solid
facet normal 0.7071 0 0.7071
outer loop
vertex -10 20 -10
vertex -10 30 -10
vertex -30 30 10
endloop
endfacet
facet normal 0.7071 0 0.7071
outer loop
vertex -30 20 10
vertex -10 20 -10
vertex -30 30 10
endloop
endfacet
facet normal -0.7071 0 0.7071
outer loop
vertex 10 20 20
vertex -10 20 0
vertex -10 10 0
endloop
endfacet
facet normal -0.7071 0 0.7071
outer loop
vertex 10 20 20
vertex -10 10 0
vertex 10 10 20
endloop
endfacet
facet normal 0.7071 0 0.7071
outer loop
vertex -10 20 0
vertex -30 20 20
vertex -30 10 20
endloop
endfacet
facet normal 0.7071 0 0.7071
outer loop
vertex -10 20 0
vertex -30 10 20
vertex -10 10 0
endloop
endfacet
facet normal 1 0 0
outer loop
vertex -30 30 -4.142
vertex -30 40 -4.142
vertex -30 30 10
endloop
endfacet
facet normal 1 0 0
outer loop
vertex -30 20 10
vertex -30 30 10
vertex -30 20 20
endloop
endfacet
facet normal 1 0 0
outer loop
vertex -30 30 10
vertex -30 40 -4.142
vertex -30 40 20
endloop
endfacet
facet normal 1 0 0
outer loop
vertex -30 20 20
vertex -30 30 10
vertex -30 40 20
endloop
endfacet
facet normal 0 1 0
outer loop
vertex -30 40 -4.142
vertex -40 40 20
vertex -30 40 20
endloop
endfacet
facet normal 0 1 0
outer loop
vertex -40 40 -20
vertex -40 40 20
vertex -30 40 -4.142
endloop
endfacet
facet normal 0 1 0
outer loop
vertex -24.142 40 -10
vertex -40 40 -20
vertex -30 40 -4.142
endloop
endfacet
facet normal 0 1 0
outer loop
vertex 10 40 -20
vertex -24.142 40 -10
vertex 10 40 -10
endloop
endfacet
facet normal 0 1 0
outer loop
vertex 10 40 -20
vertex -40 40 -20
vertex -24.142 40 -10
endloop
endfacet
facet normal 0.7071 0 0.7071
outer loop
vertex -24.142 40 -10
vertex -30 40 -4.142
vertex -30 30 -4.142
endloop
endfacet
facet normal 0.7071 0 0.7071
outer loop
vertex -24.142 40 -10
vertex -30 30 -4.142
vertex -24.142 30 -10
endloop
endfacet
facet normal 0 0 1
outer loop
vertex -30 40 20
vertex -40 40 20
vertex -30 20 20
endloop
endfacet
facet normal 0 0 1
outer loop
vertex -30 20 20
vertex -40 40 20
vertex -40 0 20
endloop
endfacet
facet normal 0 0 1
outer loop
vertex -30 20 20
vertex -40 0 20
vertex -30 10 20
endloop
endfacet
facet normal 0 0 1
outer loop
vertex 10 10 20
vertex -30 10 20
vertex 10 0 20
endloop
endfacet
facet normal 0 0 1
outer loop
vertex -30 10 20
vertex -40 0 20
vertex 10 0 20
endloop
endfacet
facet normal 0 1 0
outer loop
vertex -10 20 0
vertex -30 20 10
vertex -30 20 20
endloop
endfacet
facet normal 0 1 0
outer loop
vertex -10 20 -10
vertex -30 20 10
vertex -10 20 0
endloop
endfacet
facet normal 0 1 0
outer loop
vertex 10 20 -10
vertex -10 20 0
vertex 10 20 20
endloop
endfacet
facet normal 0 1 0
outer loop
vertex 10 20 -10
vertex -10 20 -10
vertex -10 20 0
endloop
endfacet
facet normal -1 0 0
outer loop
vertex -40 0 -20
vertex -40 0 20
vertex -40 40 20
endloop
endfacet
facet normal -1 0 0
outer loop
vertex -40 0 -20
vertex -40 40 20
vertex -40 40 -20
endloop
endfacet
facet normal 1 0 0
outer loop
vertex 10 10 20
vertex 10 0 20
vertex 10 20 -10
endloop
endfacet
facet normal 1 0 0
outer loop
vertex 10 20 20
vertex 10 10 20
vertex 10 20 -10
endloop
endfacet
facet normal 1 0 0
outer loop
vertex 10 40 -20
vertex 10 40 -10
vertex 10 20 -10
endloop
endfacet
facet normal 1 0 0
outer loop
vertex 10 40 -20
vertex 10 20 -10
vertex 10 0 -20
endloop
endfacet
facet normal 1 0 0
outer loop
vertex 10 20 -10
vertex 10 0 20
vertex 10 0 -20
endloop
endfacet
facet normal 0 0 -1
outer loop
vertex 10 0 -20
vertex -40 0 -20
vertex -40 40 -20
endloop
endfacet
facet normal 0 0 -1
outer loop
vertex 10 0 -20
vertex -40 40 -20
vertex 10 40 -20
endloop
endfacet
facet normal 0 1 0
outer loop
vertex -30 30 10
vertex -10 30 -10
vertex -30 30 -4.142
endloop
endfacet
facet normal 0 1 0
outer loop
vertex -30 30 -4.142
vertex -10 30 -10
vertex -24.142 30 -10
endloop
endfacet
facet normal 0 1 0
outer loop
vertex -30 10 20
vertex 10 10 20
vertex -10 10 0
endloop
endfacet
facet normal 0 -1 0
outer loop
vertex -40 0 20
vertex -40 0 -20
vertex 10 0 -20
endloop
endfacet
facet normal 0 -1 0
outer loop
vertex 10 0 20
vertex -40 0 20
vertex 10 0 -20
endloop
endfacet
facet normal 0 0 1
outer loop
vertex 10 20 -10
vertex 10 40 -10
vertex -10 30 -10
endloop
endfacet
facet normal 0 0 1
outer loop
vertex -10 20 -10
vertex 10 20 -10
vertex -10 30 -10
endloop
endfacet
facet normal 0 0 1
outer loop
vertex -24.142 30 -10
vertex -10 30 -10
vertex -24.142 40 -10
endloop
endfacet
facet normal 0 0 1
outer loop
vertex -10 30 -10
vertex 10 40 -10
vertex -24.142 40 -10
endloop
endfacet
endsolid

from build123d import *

# Parameters (mm, degrees)
SKETCH1_W           = 50
SKETCH1_H           = 40
BOSS_EXTRUDE1_DEPTH = 40
CUT_EXTRUDE1_DEPTH  = 10
CUT_EXTRUDE2_DEPTH  = 20
CUT_EXTRUDE3_DEPTH  = 10


with BuildPart() as part:
    # Sketch1 → Boss-Extrude1 (new body)
    with BuildSketch(Plane(origin=(0, 0, 0), x_dir=(1, 0, 0), z_dir=(0, 1, 0))):
        with Locations((-15, 0)):
            Rectangle(SKETCH1_W, SKETCH1_H)
    extrude(amount=BOSS_EXTRUDE1_DEPTH)

    # Sketch2 → Cut-Extrude1 (cut)
    with BuildSketch(Plane(origin=(0, 40, 0), x_dir=(1, 0, 0), z_dir=(0, 1, 0))):
        Polygon((-30, -10), (-30, 4.142135624), (-24.142135624, 10), (-10, 10), align=None)
    extrude(amount=-CUT_EXTRUDE1_DEPTH, mode=Mode.SUBTRACT)

    # Sketch3 → Cut-Extrude2 (cut)
    with BuildSketch(Plane(origin=(0, 40, 0), x_dir=(1, 0, 0), z_dir=(0, 1, 0))):
        Polygon((-30, -10), (-30, -20), (10, -20), (10, 10), (-10, 10), align=None)
    extrude(amount=-CUT_EXTRUDE2_DEPTH, mode=Mode.SUBTRACT)

    # Sketch4 → Cut-Extrude3 (cut)
    with BuildSketch(Plane(origin=(0, 20, 0), x_dir=(1, 0, 0), z_dir=(0, 1, 0))):
        Polygon((-30, -20), (-10, 0), (10, -20), align=None)
    extrude(amount=-CUT_EXTRUDE3_DEPTH, mode=Mode.SUBTRACT)


solid = part.part
